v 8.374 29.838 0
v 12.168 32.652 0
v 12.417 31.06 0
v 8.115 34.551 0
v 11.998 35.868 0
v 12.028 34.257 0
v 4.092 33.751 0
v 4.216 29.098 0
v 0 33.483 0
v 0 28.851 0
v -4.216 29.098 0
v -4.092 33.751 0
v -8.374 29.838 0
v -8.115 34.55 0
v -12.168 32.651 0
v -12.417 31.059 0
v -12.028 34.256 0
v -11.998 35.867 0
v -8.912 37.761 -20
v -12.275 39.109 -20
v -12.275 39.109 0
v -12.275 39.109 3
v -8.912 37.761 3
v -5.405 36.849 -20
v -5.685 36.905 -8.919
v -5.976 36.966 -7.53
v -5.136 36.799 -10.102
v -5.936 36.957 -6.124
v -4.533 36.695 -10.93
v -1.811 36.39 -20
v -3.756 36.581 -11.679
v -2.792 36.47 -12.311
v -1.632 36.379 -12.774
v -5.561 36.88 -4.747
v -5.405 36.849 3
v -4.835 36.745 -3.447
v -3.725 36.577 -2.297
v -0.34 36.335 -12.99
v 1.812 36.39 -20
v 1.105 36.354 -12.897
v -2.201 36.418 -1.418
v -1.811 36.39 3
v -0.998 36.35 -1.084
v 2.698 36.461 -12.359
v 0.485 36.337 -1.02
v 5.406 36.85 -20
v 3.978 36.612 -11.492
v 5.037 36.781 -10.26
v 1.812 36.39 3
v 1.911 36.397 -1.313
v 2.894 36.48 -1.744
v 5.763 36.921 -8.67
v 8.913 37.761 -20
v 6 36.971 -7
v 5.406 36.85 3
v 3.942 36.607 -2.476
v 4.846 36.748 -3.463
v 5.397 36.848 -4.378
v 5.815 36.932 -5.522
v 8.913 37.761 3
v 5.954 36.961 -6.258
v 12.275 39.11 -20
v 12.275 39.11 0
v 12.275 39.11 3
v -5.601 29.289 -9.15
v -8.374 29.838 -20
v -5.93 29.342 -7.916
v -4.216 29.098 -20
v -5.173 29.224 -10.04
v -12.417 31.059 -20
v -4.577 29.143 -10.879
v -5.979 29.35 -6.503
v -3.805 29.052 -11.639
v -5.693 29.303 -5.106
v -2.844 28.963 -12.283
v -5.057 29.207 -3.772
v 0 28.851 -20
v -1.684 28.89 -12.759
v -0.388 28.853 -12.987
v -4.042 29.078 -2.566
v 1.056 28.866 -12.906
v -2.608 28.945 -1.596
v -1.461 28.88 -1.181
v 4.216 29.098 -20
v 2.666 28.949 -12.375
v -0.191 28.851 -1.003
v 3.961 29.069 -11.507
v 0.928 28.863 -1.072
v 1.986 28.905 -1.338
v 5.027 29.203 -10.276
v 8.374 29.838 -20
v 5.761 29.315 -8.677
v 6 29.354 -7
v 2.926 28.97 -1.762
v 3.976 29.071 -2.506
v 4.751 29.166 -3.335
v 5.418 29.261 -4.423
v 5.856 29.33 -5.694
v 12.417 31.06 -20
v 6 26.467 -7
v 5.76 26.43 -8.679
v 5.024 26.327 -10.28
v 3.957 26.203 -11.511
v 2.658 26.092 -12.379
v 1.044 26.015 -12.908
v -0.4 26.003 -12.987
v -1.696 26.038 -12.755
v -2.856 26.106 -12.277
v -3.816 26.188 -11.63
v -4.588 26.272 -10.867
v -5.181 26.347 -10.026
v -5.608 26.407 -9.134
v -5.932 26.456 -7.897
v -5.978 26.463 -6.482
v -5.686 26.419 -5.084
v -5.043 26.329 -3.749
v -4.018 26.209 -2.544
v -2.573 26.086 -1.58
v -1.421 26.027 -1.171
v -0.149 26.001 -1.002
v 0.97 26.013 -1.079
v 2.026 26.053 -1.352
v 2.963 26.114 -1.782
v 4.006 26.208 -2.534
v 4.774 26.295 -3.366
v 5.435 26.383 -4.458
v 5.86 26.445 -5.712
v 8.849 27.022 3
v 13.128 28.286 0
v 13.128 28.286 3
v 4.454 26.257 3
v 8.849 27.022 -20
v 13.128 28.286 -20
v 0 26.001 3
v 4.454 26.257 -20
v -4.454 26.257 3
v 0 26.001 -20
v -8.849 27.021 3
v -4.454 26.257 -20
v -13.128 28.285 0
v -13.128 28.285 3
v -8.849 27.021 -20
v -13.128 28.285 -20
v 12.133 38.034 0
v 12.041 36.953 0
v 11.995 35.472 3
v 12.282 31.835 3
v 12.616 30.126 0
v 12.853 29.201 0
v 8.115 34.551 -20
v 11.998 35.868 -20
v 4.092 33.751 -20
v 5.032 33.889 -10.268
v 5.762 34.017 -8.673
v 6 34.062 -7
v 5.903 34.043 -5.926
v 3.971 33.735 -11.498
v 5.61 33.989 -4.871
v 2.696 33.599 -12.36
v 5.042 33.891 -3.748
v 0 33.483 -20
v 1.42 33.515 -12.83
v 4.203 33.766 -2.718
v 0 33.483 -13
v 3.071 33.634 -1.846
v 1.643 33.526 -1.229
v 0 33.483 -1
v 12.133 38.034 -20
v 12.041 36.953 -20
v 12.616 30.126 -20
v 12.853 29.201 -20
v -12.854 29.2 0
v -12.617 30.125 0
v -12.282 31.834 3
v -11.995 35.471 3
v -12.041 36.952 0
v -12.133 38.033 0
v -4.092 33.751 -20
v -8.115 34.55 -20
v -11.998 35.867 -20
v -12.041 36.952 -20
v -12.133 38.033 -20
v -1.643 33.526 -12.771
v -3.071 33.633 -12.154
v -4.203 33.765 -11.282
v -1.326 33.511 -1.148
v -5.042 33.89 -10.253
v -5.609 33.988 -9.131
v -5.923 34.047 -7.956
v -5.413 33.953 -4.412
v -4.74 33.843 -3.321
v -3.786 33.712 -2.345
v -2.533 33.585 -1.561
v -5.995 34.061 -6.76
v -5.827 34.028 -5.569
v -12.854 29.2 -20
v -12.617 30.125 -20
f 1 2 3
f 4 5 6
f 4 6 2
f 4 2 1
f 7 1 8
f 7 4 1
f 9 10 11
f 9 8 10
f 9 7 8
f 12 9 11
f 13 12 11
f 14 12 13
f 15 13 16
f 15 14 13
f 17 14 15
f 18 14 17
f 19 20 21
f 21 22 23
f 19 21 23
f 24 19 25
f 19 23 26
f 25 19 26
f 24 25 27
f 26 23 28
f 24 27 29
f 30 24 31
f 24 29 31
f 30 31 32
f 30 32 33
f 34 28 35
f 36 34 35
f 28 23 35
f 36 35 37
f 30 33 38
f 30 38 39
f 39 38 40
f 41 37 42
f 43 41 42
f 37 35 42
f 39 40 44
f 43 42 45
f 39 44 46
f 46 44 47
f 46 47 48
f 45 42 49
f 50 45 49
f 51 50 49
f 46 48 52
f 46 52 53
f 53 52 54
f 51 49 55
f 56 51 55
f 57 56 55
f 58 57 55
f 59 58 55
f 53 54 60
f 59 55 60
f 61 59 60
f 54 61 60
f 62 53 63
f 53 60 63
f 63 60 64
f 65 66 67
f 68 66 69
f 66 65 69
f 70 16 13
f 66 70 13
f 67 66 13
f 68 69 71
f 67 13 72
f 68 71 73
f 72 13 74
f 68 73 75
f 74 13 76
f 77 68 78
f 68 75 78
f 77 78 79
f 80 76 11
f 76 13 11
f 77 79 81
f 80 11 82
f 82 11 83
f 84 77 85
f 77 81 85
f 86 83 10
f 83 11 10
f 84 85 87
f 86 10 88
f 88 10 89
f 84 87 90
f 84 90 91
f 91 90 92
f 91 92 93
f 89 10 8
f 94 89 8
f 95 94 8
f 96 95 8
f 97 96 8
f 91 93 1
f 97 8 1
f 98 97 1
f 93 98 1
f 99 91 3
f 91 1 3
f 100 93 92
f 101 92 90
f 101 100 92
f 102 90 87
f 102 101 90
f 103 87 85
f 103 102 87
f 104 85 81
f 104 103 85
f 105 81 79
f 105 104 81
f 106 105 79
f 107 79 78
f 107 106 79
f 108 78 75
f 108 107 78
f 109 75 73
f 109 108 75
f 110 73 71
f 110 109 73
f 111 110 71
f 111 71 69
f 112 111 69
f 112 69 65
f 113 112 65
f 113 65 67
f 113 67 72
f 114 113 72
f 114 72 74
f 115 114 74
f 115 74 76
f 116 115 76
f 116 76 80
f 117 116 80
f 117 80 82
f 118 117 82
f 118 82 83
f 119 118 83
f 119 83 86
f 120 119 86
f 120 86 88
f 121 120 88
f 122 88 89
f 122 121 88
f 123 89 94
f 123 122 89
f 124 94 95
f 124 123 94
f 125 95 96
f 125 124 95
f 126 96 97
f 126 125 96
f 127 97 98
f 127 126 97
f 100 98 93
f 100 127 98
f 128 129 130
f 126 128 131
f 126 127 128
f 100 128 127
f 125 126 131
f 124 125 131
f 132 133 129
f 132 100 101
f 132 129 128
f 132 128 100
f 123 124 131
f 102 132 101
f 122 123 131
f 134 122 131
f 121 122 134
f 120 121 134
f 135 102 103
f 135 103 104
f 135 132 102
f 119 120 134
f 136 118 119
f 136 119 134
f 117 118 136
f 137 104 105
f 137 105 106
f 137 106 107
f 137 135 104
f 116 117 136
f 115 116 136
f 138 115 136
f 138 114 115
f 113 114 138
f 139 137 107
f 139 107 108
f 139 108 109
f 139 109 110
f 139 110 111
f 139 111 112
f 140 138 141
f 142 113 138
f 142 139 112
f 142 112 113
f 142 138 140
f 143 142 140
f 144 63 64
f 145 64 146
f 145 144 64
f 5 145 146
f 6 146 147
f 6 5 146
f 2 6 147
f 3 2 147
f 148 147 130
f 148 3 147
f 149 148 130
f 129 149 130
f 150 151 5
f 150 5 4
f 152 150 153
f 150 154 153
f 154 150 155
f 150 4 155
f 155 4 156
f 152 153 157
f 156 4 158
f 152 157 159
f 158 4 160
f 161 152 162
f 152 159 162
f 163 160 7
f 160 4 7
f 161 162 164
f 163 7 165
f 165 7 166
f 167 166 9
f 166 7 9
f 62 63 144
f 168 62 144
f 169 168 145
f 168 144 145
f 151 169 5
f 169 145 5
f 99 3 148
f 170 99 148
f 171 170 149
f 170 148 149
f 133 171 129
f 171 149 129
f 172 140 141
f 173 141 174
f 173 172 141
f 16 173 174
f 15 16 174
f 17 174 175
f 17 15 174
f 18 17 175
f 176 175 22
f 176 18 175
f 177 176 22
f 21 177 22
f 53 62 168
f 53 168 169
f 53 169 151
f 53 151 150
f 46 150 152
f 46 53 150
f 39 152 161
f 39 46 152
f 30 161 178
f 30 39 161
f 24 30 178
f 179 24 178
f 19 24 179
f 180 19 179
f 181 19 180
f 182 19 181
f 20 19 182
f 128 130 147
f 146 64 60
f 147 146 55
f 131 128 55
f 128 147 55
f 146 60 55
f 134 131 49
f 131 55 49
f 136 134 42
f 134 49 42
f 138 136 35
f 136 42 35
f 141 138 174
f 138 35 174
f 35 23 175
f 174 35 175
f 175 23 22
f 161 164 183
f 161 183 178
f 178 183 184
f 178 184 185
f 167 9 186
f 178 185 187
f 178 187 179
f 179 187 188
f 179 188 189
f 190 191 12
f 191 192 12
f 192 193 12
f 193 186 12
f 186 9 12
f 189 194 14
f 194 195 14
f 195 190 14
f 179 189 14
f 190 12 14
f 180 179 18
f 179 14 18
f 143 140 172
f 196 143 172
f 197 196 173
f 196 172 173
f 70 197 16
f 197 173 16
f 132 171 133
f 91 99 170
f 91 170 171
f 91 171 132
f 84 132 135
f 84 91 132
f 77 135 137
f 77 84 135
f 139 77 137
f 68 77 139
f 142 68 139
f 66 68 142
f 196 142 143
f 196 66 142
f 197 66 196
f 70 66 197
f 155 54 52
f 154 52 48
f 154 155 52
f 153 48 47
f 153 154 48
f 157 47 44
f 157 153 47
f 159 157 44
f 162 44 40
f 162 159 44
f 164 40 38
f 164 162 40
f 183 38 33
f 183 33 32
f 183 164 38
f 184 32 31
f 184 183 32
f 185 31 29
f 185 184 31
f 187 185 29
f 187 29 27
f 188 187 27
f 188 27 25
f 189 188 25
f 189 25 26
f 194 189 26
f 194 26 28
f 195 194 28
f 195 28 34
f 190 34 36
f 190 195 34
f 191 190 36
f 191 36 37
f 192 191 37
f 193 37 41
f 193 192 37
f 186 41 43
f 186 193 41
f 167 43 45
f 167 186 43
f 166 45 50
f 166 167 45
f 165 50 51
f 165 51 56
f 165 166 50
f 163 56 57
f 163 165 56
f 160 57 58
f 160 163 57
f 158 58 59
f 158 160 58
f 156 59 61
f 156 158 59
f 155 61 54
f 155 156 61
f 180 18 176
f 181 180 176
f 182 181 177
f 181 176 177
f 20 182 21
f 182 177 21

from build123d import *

# Parameters (mm, degrees)
BOSS_EXTRUDE1_DEPTH = 3
BOSS_EXTRUDE2_DEPTH = 20
SKETCH3_R           = 6
CUT_EXTRUDE1_DEPTH  = 58


with BuildPart() as part:
    # Sketch1 → Boss-Extrude1 (new body)
    with BuildSketch(Plane.XY):
        with BuildLine():
            ThreePointArc((12.275451386, 39.110148544), (12.067880772, 33.648168724), (13.127719813, 28.28598164))
            ThreePointArc((13.127719813, 28.28598164), (-5.7809e-05, 26.00056132), (-13.127971261, 28.285201272))
            ThreePointArc((-13.127971261, 28.285201272), (-12.06796259, 33.647129894), (-12.275256819, 39.10889939))
            ThreePointArc((-12.275256819, 39.10889939), (0.000238569, 36.332719941), (12.275451386, 39.110148544))
        make_face()
    extrude(amount=BOSS_EXTRUDE1_DEPTH)

    # Sketch2 → Boss-Extrude2 (add)
    with BuildSketch(Plane(origin=(0, 0, 0), x_dir=(-1, 0, 0), z_dir=(0, 0, -1))):
        with BuildLine():
            ThreePointArc((-0.000238569, 33.482719941), (6.116423648, 34.084515432), (11.998357864, 35.867368305))
            ThreePointArc((11.998357864, 35.867368305), (12.080645356, 37.492931332), (12.275256819, 39.10889939))
            ThreePointArc((12.275256819, 39.10889939), (-0.000238569, 36.332719941), (-12.275451386, 39.110148544))
            ThreePointArc((-12.275451386, 39.110148544), (-12.080742195, 37.494064654), (-11.998373995, 35.868378864))
            ThreePointArc((-11.998373995, 35.868378864), (-6.116717522, 34.085055957), (-0.000238569, 33.482719941))
        make_face()
        with BuildLine():
            ThreePointArc((-13.127719813, 28.28598164), (5.7809e-05, 26.00056132), (13.127971261, 28.285201272))
            ThreePointArc((13.127971261, 28.285201272), (12.730383089, 29.661389101), (12.417381714, 31.059244398))
            ThreePointArc((12.417381714, 31.059244398), (5.905e-06, 28.850561321), (-12.417221823, 31.060076762))
            ThreePointArc((-12.417221823, 31.060076762), (-12.730176217, 29.662196758), (-13.127719813, 28.28598164))
        make_face()
    extrude(amount=BOSS_EXTRUDE2_DEPTH)

    # Sketch3 → Cut-Extrude1 (cut)
    with BuildSketch(Plane(origin=(0, 0, 0), x_dir=(1, 0, 0), z_dir=(0, 1, 0))):
        with Locations((9.7284e-05, 7)):
            Circle(SKETCH3_R)
    extrude(amount=CUT_EXTRUDE1_DEPTH, mode=Mode.SUBTRACT)


solid = part.part
